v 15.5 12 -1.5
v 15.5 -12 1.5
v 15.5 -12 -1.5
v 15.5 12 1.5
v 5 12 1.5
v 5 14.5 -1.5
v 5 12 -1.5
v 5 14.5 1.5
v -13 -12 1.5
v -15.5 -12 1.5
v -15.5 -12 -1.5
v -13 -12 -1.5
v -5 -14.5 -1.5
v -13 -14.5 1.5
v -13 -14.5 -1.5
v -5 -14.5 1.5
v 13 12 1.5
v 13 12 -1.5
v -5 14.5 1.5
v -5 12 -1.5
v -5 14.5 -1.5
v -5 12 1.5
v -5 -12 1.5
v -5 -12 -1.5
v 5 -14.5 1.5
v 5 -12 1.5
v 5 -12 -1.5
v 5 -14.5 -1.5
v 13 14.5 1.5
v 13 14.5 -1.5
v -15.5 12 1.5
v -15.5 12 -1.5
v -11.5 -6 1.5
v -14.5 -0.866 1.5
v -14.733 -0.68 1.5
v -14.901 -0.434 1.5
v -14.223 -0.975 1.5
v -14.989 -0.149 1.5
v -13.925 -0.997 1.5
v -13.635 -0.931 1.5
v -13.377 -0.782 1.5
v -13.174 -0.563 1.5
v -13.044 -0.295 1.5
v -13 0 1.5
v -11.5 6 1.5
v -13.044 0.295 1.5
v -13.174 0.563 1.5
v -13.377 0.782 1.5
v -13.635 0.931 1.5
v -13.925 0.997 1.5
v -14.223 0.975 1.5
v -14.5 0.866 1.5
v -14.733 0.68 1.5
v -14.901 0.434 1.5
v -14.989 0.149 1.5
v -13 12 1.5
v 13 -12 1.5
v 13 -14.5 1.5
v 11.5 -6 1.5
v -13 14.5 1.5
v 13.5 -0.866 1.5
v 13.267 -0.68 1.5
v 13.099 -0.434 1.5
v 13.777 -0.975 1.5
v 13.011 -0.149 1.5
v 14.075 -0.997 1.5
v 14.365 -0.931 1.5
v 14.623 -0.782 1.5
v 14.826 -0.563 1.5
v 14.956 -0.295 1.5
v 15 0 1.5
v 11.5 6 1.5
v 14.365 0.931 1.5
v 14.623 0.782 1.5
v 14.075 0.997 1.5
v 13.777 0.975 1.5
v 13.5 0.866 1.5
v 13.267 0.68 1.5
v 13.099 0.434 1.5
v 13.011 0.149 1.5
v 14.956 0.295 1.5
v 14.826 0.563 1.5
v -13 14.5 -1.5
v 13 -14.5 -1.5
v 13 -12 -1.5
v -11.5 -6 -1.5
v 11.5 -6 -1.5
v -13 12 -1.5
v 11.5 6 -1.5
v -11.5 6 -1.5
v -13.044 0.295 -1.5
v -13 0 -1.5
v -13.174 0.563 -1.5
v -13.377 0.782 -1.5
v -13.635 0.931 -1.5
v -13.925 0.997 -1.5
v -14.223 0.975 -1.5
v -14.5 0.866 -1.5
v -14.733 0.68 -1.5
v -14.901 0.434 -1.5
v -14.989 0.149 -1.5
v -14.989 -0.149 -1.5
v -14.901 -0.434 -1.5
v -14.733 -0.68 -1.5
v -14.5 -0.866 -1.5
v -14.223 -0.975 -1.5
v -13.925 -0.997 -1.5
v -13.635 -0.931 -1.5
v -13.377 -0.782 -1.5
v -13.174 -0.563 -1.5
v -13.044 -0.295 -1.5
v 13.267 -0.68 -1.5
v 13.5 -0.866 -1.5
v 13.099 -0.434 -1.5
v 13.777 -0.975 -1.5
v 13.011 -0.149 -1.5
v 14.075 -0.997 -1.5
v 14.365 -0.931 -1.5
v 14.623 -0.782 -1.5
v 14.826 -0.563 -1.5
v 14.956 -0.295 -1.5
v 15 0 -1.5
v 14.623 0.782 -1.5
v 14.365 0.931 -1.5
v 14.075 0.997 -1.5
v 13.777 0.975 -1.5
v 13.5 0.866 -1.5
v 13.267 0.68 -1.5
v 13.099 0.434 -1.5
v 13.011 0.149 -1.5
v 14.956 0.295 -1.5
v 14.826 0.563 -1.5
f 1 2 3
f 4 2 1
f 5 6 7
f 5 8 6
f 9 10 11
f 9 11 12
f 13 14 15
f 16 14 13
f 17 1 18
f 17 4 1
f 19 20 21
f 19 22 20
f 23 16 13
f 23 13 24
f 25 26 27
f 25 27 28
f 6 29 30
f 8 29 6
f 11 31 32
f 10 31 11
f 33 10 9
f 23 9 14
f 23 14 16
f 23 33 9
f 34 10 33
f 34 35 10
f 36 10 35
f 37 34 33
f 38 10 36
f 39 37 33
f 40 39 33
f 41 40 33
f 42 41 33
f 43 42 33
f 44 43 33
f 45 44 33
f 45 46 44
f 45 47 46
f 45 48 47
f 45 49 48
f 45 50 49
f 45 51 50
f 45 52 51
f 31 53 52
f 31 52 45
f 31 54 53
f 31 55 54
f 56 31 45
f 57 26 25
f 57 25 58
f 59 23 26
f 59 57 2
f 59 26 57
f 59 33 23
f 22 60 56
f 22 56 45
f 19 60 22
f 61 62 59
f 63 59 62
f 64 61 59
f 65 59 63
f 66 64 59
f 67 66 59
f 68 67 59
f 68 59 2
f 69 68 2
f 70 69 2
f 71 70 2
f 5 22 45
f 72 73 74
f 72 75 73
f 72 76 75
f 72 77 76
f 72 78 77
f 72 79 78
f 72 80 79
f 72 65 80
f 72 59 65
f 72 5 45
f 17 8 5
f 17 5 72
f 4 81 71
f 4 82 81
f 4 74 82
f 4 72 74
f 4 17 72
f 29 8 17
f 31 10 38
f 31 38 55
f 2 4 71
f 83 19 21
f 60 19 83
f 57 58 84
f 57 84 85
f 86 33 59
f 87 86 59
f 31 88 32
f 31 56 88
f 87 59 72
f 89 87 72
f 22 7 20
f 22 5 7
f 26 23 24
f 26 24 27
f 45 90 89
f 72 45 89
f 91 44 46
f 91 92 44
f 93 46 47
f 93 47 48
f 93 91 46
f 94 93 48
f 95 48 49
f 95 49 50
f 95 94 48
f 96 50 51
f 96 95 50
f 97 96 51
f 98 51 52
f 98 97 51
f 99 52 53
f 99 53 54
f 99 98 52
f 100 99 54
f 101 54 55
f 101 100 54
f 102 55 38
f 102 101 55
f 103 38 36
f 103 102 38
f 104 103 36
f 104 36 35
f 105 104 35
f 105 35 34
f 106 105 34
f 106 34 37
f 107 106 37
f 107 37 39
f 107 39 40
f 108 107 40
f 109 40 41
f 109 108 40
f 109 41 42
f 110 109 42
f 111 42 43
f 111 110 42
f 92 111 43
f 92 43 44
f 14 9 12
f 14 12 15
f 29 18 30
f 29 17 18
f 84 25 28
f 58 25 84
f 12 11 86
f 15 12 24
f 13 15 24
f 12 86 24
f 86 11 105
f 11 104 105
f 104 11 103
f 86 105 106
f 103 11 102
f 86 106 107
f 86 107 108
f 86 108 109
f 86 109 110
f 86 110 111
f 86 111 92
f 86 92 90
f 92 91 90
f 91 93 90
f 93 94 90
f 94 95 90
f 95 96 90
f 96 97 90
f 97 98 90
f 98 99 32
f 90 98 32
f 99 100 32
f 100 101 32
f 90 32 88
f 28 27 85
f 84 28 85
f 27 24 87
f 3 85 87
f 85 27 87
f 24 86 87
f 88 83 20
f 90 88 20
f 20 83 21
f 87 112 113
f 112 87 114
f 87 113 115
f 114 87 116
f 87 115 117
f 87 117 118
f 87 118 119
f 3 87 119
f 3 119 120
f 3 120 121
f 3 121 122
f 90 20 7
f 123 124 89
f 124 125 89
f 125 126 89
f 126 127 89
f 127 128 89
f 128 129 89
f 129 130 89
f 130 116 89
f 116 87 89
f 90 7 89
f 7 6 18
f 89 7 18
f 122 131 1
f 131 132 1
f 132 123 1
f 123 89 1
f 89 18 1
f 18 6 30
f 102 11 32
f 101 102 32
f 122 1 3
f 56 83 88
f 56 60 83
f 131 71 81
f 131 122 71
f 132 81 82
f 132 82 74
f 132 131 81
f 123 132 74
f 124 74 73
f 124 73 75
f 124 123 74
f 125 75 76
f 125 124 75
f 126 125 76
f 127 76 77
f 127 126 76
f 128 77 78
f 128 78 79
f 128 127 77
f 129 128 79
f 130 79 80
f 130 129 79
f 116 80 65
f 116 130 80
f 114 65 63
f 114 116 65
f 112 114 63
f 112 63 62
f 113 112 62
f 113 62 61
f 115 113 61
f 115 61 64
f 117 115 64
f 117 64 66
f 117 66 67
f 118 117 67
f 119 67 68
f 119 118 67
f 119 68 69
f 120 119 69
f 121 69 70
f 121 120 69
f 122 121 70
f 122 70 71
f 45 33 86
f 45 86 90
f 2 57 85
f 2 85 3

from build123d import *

# Parameters (mm, degrees)
SKETCH1_R           = 1
SKETCH1_W           = 23
SKETCH1_H           = 12
BOSS_EXTRUDE1_DEPTH = 1.5


with BuildPart() as part:
    # Sketch1 → Boss-Extrude1 (new body, symmetric)
    with BuildSketch(Plane.XY):
        Polygon((-13, 12), (-15.5, 12), (-15.5, -12), (-13, -12), (-13, -14.5), (-5, -14.5), (-5, -12), (5, -12), (5, -14.5), (13, -14.5), (13, -12), (15.5, -12), (15.5, 12), (13, 12), (13, 14.5), (5, 14.5), (5, 12), (-5, 12), (-5, 14.5), (-13, 14.5), align=None)
        with Locations((-14, 0)):
            Circle(SKETCH1_R, mode=Mode.SUBTRACT)
        Rectangle(SKETCH1_W, SKETCH1_H, mode=Mode.SUBTRACT)
        with Locations((14, 0)):
            Circle(SKETCH1_R, mode=Mode.SUBTRACT)
    extrude(amount=BOSS_EXTRUDE1_DEPTH, both=True)


solid = part.part
